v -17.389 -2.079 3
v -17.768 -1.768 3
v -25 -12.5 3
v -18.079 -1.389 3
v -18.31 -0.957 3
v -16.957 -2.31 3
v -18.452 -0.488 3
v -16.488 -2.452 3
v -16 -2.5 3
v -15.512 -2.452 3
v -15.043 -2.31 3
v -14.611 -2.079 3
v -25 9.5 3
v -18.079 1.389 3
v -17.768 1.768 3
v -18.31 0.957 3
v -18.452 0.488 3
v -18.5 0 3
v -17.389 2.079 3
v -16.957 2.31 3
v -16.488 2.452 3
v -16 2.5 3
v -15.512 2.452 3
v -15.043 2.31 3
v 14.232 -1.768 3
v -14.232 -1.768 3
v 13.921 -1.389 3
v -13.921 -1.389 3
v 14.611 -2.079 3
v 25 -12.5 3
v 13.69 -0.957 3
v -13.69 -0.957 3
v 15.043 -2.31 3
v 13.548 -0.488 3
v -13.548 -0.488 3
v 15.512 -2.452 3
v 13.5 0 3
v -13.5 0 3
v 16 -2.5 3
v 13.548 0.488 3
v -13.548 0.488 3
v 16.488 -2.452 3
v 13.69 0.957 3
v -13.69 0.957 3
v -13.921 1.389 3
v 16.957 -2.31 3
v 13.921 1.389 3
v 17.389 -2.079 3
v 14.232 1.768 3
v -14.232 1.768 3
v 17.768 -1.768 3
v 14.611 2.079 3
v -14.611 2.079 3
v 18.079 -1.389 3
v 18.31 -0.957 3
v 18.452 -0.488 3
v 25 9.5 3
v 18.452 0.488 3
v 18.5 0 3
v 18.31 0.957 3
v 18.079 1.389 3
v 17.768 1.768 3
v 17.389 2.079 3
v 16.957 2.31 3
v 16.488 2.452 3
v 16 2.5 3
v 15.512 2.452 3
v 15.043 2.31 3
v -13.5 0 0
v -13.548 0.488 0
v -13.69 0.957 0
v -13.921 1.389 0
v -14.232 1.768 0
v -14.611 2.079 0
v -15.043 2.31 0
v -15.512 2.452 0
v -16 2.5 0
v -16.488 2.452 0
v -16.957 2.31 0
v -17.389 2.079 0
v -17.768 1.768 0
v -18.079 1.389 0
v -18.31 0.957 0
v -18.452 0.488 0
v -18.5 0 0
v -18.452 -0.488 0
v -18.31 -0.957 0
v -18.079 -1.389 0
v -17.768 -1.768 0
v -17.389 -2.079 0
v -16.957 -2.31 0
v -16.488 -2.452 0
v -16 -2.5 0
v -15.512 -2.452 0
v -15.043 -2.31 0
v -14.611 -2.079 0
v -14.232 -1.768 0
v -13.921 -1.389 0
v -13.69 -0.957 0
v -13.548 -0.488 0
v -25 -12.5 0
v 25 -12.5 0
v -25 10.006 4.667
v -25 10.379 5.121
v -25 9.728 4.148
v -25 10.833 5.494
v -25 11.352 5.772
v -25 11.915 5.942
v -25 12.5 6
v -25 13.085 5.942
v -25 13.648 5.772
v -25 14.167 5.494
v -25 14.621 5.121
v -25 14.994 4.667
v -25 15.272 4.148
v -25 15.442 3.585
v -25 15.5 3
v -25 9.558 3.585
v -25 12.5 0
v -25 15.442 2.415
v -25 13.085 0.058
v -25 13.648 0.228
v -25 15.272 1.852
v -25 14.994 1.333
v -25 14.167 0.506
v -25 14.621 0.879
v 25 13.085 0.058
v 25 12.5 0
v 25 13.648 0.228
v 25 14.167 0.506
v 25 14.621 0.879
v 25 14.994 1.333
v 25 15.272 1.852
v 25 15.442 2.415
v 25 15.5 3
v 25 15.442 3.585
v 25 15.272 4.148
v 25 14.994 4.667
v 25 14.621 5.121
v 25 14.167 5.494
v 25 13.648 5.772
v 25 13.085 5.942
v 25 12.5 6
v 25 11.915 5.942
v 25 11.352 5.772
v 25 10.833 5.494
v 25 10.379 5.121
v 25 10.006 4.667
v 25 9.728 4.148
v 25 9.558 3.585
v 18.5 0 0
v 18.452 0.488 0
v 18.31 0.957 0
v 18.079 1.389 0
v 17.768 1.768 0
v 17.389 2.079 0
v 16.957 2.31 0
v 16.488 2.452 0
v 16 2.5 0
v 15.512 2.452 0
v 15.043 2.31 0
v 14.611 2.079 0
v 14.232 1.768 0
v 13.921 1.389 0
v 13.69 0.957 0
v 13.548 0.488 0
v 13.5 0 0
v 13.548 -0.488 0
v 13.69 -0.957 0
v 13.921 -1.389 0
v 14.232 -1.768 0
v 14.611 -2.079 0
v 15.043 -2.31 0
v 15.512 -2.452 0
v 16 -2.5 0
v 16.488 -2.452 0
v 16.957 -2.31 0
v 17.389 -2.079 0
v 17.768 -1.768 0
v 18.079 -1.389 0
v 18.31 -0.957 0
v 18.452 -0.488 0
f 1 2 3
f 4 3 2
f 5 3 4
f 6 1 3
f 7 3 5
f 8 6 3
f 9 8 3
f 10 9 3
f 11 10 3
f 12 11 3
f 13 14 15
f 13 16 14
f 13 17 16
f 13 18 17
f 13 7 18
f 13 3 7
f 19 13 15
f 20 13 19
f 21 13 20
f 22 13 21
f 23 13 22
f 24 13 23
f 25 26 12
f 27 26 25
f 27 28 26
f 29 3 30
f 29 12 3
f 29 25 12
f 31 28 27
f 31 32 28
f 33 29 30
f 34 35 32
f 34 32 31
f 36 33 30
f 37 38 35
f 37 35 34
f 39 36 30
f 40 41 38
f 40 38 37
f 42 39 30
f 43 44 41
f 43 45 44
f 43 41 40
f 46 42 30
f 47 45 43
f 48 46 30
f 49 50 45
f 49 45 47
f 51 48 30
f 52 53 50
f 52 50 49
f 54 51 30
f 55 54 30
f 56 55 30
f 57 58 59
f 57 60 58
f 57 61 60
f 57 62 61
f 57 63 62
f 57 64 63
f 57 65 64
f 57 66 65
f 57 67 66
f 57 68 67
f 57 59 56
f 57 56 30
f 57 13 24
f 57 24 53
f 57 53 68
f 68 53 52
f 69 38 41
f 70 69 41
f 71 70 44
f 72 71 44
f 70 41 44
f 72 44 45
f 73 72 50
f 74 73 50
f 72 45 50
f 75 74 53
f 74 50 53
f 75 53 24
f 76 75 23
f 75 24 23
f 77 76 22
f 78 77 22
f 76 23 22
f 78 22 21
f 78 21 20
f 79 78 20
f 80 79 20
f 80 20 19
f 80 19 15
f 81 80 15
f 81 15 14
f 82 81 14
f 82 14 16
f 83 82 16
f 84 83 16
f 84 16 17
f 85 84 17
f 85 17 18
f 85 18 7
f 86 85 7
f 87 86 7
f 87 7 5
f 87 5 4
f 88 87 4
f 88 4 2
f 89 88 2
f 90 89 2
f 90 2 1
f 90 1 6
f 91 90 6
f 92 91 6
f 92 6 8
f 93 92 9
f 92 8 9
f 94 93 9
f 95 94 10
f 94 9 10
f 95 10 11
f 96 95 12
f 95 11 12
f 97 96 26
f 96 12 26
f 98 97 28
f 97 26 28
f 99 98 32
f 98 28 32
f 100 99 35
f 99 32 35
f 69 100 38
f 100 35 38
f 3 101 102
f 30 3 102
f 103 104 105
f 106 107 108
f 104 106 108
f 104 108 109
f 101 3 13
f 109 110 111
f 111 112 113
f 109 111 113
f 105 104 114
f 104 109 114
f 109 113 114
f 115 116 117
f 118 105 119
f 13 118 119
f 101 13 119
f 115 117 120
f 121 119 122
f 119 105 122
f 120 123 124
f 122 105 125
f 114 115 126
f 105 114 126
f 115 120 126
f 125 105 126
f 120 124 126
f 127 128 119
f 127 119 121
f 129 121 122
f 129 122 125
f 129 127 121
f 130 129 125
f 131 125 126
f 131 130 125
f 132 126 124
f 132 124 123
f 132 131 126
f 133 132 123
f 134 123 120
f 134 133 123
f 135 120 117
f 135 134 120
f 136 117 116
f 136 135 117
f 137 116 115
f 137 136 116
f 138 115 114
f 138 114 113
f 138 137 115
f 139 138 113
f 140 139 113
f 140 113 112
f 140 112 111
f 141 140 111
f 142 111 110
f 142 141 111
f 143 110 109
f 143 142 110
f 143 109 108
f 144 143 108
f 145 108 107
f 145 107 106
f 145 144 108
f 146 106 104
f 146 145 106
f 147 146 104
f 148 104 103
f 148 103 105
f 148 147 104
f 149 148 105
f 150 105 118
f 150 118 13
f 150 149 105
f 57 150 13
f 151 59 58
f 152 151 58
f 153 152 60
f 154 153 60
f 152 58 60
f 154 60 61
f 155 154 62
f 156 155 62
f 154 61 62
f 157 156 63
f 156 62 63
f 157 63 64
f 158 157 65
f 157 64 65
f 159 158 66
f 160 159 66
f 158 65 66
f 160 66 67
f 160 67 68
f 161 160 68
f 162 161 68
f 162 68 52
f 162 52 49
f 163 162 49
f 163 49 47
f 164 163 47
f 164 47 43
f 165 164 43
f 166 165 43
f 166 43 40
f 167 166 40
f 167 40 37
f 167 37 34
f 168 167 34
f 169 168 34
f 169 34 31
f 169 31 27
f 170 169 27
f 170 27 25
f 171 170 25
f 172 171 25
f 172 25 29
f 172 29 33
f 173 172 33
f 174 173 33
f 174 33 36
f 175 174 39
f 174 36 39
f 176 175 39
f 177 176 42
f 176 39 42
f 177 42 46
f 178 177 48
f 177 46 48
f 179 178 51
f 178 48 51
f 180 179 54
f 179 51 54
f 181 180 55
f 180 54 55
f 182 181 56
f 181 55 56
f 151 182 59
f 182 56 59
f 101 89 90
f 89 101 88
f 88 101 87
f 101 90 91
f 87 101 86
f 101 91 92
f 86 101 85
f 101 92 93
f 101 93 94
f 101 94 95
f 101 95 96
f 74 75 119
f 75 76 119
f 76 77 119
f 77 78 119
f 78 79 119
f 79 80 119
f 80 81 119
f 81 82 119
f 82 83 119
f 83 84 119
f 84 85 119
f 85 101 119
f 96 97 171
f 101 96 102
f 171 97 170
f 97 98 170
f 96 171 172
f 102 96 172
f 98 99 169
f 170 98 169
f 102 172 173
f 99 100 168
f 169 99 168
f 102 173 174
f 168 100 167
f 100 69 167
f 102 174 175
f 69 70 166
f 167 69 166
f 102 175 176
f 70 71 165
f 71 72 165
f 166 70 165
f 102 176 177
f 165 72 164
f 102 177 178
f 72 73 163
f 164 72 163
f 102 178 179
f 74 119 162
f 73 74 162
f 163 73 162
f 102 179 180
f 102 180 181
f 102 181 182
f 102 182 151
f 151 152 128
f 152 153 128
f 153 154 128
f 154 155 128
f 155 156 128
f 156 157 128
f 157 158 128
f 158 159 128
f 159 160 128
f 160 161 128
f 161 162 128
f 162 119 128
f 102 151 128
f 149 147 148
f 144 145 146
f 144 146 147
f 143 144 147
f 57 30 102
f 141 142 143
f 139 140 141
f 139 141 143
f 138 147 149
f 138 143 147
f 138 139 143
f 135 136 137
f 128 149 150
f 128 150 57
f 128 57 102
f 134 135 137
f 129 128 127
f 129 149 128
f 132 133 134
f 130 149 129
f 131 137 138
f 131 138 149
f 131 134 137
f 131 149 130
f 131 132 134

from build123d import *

# Parameters (mm, degrees)
ESQUISSE1_W             = 50
ESQUISSE1_H             = 25
BOSS_EXTRU_1_DEPTH      = 3
ESQUISSE2_R             = 3
BOSS_EXTRU_2_DEPTH      = 25
ESQUISSE3_R             = 2.5
ENL_V_MAT_EXTRU_1_DEPTH = 30.567718884


with BuildPart() as part:
    # Esquisse1 → Boss.-Extru.1 (new body)
    with BuildSketch(Plane.XY):
        Rectangle(ESQUISSE1_W, ESQUISSE1_H)
    extrude(amount=BOSS_EXTRU_1_DEPTH)

    # Esquisse2 → Boss.-Extru.2 (add, symmetric)
    with BuildSketch(Plane(origin=(0, 0, 0), x_dir=(0, 0, -1), z_dir=(1, 0, 0))):
        with Locations((-3, 12.5)):
            Circle(ESQUISSE2_R)
    extrude(amount=BOSS_EXTRU_2_DEPTH, both=True)

    # Esquisse3 → Enlèv. mat.-Extru.1 (cut, through all)
    with BuildSketch(Plane.XY.offset(3)):
        with Locations((-16, 0)):
            Circle(ESQUISSE3_R)
        with Locations((16, 0)):
            Circle(ESQUISSE3_R)
    extrude(amount=-ENL_V_MAT_EXTRU_1_DEPTH, mode=Mode.SUBTRACT)


solid = part.part
